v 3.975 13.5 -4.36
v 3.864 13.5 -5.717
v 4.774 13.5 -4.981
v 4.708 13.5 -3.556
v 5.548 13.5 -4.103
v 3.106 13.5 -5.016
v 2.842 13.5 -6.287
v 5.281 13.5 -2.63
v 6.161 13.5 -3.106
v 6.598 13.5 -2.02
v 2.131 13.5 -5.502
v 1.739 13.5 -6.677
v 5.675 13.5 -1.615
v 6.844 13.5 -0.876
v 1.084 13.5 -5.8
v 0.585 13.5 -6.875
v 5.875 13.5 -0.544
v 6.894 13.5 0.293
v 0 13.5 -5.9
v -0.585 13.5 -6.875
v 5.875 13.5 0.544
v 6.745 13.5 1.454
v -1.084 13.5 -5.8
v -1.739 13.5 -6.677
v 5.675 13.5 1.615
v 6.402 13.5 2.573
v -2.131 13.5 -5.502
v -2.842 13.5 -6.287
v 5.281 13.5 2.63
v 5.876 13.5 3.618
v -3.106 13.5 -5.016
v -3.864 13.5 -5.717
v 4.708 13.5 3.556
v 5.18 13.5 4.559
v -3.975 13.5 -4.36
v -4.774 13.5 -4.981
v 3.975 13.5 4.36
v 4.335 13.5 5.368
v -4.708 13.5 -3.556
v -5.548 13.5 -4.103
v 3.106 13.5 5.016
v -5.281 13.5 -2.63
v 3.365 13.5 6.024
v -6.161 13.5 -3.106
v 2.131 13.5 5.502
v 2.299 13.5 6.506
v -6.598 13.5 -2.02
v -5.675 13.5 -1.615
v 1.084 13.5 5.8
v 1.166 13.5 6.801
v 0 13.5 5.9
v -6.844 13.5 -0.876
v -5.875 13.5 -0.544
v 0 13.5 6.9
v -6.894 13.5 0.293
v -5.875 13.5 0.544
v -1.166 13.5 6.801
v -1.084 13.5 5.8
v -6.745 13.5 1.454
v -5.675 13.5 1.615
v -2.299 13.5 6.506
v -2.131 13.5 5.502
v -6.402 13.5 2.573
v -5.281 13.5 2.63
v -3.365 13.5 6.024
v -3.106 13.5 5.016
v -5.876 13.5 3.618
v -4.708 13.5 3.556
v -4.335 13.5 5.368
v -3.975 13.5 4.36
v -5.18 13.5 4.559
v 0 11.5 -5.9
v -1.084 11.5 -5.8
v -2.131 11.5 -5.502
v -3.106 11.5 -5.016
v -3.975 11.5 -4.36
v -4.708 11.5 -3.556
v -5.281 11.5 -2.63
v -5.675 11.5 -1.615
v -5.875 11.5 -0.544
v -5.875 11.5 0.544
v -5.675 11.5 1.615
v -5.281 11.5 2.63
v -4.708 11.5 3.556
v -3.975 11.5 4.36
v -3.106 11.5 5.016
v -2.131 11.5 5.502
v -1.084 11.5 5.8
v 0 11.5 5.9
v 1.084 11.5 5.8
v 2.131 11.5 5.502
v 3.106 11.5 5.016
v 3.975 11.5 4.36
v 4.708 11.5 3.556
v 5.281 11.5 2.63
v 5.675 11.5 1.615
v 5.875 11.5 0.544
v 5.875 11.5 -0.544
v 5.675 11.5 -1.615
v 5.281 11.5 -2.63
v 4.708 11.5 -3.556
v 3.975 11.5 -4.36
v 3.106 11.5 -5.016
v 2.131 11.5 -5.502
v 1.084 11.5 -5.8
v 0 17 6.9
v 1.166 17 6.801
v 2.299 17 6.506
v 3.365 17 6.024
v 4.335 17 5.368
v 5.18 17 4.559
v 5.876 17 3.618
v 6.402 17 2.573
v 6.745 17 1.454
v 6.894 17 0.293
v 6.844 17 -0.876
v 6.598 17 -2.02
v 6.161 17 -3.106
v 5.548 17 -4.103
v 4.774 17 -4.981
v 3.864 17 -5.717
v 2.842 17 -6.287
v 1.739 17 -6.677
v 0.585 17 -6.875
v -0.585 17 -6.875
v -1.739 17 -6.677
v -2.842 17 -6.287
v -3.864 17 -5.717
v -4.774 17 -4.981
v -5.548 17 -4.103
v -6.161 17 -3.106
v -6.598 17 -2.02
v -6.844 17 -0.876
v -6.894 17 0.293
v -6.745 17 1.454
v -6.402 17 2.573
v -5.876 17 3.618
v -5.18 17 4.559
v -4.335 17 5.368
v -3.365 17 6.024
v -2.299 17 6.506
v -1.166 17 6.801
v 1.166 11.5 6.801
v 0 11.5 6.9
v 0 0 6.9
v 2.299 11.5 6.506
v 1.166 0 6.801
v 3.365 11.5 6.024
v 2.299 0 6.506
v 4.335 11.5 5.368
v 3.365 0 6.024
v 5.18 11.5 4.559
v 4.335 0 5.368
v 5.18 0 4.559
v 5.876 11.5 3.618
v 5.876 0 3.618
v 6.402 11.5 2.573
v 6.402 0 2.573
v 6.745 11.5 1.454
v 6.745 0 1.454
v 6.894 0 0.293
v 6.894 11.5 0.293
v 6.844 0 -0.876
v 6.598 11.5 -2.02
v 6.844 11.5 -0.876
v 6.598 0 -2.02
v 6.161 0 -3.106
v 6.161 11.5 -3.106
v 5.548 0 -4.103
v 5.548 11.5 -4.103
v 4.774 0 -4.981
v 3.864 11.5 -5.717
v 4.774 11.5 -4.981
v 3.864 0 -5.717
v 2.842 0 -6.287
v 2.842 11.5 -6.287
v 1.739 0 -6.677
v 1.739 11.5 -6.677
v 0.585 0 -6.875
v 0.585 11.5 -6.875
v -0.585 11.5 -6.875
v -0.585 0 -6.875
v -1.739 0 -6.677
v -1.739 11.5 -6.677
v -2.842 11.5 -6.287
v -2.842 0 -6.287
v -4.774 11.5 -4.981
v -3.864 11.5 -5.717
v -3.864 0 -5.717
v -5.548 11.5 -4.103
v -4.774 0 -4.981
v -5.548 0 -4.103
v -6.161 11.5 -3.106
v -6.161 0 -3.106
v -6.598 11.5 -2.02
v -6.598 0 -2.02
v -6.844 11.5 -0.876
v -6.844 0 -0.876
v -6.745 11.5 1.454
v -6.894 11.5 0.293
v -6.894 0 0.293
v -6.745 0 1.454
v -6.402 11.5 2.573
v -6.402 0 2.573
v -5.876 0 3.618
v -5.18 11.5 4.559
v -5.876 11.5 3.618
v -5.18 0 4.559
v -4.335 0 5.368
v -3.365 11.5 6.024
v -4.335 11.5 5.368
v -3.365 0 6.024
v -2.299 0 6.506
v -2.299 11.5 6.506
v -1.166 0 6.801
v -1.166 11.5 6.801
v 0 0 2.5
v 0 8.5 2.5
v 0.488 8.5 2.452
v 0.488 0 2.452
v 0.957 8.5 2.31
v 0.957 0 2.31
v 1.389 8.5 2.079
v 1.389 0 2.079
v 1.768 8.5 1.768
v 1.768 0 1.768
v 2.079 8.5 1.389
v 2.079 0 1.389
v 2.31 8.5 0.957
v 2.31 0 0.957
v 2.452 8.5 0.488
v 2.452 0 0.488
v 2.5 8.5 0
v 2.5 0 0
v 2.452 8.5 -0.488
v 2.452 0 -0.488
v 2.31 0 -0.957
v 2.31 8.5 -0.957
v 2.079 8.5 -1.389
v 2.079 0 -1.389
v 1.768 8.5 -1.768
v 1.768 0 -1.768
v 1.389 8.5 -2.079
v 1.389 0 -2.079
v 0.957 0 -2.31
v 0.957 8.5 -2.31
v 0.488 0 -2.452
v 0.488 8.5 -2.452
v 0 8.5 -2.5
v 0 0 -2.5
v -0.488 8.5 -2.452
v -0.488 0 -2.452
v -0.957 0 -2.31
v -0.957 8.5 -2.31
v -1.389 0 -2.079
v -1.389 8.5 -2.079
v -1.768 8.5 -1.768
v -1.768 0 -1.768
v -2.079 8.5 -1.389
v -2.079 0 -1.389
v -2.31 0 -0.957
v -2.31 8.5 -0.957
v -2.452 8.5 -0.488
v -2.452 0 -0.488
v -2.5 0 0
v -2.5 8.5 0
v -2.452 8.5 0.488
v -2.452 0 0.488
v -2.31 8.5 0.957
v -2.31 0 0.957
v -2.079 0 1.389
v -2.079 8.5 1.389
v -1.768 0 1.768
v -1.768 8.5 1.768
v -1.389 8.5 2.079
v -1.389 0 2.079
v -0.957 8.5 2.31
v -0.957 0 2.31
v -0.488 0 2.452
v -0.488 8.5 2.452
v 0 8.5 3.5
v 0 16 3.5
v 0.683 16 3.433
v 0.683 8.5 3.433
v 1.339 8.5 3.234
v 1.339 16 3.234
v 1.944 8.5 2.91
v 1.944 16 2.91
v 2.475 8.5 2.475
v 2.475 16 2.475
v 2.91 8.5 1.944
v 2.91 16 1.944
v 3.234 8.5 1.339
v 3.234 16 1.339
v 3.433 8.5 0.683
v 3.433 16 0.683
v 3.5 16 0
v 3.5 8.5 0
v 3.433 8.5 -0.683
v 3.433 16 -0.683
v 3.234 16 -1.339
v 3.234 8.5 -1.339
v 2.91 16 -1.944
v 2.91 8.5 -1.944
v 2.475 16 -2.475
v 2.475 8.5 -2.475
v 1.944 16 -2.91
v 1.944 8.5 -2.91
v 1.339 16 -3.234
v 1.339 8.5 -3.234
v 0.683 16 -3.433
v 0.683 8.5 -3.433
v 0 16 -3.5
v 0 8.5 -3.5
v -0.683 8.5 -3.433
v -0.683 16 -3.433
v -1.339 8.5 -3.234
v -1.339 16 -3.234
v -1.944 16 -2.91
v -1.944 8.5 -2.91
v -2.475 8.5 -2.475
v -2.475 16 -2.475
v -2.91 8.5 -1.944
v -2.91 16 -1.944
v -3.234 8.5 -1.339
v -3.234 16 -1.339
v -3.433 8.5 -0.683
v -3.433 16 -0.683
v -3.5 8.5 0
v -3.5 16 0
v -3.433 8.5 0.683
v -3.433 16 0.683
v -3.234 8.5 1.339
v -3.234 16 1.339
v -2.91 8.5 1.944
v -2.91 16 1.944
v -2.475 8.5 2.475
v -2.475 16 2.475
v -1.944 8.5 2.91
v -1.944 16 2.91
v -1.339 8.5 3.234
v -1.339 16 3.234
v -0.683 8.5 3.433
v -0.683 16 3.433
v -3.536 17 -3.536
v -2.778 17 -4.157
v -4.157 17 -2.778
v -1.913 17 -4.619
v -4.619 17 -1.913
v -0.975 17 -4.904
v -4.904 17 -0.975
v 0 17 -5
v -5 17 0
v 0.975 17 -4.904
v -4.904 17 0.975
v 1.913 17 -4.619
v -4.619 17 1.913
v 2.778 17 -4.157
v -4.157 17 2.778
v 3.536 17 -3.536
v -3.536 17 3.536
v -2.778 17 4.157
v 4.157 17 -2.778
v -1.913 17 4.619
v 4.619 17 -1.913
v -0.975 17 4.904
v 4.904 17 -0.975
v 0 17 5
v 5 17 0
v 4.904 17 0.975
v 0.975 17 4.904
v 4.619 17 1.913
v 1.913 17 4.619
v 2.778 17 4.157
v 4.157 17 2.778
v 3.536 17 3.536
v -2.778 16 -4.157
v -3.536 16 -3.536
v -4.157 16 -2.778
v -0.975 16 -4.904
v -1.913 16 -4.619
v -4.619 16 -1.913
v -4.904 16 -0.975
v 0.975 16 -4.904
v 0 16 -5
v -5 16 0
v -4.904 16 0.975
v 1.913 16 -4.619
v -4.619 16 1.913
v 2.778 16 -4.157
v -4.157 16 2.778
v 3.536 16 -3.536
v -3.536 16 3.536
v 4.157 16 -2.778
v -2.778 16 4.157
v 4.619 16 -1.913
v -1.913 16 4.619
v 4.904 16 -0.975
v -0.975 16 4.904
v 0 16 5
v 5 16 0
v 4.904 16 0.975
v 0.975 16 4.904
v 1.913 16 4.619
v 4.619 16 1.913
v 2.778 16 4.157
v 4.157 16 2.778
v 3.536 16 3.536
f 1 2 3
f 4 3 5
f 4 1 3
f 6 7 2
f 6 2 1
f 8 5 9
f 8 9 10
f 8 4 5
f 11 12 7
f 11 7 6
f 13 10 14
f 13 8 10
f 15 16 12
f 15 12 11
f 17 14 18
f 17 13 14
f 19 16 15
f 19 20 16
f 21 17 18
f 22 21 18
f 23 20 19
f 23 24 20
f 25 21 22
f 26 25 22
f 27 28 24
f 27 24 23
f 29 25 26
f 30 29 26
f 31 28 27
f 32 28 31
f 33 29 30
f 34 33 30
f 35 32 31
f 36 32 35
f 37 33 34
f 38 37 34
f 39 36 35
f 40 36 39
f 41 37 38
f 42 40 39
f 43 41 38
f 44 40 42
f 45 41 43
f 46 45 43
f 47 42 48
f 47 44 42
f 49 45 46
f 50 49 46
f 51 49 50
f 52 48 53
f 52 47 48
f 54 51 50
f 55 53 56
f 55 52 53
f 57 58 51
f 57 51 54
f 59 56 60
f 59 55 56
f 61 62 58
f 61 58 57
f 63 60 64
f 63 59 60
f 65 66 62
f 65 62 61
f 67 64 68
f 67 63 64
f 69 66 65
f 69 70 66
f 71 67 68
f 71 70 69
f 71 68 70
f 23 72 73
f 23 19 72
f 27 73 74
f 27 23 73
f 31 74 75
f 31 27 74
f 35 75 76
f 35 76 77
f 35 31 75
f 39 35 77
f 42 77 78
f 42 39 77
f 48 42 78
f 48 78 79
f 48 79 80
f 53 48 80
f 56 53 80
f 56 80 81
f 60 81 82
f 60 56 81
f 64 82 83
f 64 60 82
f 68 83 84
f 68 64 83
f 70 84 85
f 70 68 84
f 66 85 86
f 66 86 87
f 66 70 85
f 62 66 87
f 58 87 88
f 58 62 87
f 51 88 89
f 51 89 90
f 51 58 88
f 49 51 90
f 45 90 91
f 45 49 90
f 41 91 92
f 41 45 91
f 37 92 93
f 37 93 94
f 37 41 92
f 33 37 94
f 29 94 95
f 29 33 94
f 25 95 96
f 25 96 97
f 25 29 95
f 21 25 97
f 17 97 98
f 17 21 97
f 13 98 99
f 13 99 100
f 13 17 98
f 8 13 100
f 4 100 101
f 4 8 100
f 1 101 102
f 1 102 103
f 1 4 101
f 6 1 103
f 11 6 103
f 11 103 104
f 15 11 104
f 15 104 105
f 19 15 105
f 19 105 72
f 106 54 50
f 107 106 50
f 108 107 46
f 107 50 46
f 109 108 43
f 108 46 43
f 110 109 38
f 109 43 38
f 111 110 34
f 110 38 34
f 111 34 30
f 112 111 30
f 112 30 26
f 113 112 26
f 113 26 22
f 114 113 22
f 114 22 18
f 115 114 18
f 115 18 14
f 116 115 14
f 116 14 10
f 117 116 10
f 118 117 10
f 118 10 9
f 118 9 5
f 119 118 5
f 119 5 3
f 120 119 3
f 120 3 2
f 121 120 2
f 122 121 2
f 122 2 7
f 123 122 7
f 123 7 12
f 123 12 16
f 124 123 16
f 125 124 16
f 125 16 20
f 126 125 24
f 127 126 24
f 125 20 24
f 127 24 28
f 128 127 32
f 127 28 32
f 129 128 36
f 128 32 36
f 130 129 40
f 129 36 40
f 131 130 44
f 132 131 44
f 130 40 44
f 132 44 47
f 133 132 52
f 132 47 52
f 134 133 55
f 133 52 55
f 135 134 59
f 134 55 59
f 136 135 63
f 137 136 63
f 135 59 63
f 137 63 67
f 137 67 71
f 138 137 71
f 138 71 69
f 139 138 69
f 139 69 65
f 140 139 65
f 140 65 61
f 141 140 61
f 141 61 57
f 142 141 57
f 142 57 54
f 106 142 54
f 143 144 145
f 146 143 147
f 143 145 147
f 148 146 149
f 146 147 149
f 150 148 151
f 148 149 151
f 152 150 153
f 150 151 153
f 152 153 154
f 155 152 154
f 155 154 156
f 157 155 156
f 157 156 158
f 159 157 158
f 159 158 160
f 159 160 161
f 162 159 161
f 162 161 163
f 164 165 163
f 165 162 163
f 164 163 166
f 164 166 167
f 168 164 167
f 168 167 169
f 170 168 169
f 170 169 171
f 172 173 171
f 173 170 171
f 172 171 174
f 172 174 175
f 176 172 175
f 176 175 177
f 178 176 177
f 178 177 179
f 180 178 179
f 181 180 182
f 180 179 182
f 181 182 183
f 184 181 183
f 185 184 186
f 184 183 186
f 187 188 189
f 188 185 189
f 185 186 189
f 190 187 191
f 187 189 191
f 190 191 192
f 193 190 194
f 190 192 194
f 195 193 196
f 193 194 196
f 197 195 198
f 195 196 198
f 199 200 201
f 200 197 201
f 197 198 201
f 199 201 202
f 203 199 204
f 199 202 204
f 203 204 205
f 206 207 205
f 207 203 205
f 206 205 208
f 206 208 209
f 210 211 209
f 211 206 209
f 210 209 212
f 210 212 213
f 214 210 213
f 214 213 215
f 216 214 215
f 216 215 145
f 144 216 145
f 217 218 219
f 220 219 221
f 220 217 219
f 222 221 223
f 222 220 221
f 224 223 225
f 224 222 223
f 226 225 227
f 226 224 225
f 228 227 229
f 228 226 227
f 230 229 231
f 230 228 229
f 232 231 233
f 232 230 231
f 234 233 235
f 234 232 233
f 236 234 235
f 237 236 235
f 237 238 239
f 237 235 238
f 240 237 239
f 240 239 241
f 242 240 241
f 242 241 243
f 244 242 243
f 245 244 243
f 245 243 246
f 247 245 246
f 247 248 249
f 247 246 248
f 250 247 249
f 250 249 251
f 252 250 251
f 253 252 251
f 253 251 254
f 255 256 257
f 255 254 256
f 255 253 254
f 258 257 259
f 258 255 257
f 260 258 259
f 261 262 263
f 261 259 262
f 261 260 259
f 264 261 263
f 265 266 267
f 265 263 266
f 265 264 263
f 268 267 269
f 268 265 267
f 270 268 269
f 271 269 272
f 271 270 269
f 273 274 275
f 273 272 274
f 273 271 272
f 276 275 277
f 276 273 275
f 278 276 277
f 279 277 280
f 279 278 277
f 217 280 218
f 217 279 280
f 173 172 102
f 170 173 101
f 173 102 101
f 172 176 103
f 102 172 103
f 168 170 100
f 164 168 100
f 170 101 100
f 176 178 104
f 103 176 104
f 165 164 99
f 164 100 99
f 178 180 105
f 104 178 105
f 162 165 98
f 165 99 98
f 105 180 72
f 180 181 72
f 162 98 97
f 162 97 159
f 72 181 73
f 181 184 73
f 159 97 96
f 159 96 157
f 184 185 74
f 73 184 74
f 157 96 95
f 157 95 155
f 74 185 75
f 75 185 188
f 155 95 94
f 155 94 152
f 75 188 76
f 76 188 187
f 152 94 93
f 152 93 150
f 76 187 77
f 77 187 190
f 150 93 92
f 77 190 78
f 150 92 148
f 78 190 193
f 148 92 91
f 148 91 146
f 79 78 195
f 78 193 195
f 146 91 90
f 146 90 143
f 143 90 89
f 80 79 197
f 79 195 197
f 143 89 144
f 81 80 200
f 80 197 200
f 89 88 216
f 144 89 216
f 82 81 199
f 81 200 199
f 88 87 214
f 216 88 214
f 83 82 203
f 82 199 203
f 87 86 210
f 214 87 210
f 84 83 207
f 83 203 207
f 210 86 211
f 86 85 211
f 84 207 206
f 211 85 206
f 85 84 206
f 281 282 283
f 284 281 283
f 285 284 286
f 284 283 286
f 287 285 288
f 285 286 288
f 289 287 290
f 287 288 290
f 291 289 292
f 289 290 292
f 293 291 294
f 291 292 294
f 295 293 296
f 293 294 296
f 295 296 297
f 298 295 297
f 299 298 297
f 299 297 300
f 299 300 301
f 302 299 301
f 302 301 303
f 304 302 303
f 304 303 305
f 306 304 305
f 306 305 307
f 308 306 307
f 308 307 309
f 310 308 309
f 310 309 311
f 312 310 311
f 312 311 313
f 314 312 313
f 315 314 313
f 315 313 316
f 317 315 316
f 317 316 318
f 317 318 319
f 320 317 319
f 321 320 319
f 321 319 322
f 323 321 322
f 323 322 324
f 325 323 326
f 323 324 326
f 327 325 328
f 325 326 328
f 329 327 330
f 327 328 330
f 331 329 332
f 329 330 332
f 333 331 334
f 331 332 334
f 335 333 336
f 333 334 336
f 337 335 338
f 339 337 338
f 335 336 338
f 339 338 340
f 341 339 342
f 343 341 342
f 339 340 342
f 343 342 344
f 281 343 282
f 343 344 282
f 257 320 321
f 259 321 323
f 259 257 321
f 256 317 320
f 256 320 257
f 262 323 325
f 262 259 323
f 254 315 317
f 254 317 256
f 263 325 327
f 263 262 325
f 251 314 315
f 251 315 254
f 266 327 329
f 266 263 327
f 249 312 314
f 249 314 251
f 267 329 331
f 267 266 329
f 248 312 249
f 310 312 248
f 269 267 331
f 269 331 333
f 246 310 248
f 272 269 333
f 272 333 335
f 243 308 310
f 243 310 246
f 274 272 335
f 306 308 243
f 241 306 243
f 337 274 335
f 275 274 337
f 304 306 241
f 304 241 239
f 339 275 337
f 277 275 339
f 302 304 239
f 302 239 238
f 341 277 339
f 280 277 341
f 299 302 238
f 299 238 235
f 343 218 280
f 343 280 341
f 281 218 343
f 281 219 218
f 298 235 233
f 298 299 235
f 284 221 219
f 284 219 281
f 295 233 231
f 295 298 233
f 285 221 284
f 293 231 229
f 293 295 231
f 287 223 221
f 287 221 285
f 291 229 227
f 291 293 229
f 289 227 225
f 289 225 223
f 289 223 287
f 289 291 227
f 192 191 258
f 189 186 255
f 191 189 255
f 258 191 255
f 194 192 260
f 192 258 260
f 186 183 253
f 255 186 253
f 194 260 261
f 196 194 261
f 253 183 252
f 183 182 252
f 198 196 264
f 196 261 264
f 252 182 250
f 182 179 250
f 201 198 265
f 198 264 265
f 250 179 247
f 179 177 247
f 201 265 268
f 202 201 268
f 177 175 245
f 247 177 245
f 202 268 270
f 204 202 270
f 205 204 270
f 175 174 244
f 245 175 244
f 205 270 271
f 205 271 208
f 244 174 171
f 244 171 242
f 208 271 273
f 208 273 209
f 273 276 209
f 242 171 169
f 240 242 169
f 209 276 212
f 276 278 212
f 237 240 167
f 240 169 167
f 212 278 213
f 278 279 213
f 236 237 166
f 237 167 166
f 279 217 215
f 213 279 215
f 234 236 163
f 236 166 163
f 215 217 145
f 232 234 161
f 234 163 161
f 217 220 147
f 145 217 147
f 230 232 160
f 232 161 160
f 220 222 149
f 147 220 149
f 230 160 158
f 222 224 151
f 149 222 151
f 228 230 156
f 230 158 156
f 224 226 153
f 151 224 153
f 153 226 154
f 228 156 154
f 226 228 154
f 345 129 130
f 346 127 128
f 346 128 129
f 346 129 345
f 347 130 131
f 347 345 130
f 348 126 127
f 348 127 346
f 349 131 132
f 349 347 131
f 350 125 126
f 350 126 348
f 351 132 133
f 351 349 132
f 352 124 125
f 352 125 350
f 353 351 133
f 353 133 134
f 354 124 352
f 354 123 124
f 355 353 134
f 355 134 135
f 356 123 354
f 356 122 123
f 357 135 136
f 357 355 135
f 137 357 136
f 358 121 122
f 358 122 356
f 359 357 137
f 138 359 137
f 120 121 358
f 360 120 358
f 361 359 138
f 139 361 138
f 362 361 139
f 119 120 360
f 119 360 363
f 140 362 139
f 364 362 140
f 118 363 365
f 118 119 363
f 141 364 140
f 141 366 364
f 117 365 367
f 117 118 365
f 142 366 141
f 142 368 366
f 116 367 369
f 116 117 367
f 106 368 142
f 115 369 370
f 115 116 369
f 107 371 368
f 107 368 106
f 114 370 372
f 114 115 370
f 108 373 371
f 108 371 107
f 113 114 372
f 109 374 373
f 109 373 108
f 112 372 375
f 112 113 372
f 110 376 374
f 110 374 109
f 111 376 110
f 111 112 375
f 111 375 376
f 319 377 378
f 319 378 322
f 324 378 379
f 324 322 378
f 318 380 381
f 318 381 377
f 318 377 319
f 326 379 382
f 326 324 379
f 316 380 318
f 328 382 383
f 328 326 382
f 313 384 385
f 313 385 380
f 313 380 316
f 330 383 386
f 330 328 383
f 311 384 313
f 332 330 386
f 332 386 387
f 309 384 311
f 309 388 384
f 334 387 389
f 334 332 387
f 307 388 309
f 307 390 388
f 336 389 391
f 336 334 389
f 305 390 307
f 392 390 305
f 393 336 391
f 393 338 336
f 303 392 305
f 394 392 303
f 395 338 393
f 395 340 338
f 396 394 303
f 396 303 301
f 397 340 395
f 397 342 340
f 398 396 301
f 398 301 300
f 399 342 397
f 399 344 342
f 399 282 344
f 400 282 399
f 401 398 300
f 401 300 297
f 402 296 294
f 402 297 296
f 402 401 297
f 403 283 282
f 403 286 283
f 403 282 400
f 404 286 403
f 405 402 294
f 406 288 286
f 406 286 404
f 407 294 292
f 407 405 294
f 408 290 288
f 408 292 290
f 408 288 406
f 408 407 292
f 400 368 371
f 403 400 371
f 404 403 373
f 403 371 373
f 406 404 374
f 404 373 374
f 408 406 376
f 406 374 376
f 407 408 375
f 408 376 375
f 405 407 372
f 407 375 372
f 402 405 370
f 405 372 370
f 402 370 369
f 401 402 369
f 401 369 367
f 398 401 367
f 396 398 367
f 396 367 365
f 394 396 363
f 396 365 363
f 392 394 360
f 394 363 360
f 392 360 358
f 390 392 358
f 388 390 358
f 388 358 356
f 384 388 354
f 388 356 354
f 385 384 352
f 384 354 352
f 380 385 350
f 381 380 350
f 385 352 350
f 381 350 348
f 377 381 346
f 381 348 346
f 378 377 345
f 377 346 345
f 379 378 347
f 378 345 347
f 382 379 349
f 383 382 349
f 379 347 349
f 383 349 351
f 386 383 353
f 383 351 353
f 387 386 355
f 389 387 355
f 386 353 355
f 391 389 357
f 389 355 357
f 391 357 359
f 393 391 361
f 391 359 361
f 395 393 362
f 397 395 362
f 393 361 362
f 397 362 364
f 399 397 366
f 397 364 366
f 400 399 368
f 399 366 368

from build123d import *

# Parameters (mm, degrees)
SKETCH_1_R          = 6.9
SKETCH_1_R_2        = 2.5
EXTRUDE_1_DEPTH     = 17
SKETCH_2_R          = 3.5
CUT_EXTRUDE_1_DEPTH = 8.5
SKETCH_3_R          = 5
CUT_EXTRUDE_2_DEPTH = 1
SKETCH_4_W          = 2.072752753
SKETCH_4_H          = 2


with BuildPart() as part:
    # 草图1 → 凸台-拉伸1 (new body)
    with BuildSketch(Plane(origin=(0, 0, 0), x_dir=(1, 0, 0), z_dir=(0, 1, 0))):
        with Locations(Location((0, 0, 0), (0, 0, 270))):
            Circle(SKETCH_1_R)
        with Locations(Location((0, 0, 0), (0, 0, 270))):
            Circle(SKETCH_1_R_2, mode=Mode.SUBTRACT)
    extrude(amount=EXTRUDE_1_DEPTH)

    # 草图2 → 切除-拉伸1 (cut)
    with BuildSketch(Plane(origin=(0, 17, 0), x_dir=(1, 0, 0), z_dir=(0, 1, 0))):
        with Locations(Location((0, 0, 0), (0, 0, 270))):
            Circle(SKETCH_2_R)
    extrude(amount=-CUT_EXTRUDE_1_DEPTH, mode=Mode.SUBTRACT)

    # 草图3 → 切除-拉伸2 (cut)
    with BuildSketch(Plane(origin=(0, 17, 0), x_dir=(1, 0, 0), z_dir=(0, 1, 0))):
        with Locations(Location((0, 0, 0), (0, 0, 270))):
            Circle(SKETCH_3_R)
    extrude(amount=-CUT_EXTRUDE_2_DEPTH, mode=Mode.SUBTRACT)

    # 草图4 → 切除-旋转1 (revolve, cut)
    with BuildSketch(Plane.XY, mode=Mode.PRIVATE) as cut_revolve_1_sk:
        with Locations((6.936376377, 12.5)):
            Rectangle(SKETCH_4_W, SKETCH_4_H)
    revolve(cut_revolve_1_sk.sketch.rotate(Axis((0, 0, 0), (0, 1, 0)), 90), axis=Axis((0, 0, 0), (0, 1, 0)), mode=Mode.SUBTRACT)


solid = part.part
